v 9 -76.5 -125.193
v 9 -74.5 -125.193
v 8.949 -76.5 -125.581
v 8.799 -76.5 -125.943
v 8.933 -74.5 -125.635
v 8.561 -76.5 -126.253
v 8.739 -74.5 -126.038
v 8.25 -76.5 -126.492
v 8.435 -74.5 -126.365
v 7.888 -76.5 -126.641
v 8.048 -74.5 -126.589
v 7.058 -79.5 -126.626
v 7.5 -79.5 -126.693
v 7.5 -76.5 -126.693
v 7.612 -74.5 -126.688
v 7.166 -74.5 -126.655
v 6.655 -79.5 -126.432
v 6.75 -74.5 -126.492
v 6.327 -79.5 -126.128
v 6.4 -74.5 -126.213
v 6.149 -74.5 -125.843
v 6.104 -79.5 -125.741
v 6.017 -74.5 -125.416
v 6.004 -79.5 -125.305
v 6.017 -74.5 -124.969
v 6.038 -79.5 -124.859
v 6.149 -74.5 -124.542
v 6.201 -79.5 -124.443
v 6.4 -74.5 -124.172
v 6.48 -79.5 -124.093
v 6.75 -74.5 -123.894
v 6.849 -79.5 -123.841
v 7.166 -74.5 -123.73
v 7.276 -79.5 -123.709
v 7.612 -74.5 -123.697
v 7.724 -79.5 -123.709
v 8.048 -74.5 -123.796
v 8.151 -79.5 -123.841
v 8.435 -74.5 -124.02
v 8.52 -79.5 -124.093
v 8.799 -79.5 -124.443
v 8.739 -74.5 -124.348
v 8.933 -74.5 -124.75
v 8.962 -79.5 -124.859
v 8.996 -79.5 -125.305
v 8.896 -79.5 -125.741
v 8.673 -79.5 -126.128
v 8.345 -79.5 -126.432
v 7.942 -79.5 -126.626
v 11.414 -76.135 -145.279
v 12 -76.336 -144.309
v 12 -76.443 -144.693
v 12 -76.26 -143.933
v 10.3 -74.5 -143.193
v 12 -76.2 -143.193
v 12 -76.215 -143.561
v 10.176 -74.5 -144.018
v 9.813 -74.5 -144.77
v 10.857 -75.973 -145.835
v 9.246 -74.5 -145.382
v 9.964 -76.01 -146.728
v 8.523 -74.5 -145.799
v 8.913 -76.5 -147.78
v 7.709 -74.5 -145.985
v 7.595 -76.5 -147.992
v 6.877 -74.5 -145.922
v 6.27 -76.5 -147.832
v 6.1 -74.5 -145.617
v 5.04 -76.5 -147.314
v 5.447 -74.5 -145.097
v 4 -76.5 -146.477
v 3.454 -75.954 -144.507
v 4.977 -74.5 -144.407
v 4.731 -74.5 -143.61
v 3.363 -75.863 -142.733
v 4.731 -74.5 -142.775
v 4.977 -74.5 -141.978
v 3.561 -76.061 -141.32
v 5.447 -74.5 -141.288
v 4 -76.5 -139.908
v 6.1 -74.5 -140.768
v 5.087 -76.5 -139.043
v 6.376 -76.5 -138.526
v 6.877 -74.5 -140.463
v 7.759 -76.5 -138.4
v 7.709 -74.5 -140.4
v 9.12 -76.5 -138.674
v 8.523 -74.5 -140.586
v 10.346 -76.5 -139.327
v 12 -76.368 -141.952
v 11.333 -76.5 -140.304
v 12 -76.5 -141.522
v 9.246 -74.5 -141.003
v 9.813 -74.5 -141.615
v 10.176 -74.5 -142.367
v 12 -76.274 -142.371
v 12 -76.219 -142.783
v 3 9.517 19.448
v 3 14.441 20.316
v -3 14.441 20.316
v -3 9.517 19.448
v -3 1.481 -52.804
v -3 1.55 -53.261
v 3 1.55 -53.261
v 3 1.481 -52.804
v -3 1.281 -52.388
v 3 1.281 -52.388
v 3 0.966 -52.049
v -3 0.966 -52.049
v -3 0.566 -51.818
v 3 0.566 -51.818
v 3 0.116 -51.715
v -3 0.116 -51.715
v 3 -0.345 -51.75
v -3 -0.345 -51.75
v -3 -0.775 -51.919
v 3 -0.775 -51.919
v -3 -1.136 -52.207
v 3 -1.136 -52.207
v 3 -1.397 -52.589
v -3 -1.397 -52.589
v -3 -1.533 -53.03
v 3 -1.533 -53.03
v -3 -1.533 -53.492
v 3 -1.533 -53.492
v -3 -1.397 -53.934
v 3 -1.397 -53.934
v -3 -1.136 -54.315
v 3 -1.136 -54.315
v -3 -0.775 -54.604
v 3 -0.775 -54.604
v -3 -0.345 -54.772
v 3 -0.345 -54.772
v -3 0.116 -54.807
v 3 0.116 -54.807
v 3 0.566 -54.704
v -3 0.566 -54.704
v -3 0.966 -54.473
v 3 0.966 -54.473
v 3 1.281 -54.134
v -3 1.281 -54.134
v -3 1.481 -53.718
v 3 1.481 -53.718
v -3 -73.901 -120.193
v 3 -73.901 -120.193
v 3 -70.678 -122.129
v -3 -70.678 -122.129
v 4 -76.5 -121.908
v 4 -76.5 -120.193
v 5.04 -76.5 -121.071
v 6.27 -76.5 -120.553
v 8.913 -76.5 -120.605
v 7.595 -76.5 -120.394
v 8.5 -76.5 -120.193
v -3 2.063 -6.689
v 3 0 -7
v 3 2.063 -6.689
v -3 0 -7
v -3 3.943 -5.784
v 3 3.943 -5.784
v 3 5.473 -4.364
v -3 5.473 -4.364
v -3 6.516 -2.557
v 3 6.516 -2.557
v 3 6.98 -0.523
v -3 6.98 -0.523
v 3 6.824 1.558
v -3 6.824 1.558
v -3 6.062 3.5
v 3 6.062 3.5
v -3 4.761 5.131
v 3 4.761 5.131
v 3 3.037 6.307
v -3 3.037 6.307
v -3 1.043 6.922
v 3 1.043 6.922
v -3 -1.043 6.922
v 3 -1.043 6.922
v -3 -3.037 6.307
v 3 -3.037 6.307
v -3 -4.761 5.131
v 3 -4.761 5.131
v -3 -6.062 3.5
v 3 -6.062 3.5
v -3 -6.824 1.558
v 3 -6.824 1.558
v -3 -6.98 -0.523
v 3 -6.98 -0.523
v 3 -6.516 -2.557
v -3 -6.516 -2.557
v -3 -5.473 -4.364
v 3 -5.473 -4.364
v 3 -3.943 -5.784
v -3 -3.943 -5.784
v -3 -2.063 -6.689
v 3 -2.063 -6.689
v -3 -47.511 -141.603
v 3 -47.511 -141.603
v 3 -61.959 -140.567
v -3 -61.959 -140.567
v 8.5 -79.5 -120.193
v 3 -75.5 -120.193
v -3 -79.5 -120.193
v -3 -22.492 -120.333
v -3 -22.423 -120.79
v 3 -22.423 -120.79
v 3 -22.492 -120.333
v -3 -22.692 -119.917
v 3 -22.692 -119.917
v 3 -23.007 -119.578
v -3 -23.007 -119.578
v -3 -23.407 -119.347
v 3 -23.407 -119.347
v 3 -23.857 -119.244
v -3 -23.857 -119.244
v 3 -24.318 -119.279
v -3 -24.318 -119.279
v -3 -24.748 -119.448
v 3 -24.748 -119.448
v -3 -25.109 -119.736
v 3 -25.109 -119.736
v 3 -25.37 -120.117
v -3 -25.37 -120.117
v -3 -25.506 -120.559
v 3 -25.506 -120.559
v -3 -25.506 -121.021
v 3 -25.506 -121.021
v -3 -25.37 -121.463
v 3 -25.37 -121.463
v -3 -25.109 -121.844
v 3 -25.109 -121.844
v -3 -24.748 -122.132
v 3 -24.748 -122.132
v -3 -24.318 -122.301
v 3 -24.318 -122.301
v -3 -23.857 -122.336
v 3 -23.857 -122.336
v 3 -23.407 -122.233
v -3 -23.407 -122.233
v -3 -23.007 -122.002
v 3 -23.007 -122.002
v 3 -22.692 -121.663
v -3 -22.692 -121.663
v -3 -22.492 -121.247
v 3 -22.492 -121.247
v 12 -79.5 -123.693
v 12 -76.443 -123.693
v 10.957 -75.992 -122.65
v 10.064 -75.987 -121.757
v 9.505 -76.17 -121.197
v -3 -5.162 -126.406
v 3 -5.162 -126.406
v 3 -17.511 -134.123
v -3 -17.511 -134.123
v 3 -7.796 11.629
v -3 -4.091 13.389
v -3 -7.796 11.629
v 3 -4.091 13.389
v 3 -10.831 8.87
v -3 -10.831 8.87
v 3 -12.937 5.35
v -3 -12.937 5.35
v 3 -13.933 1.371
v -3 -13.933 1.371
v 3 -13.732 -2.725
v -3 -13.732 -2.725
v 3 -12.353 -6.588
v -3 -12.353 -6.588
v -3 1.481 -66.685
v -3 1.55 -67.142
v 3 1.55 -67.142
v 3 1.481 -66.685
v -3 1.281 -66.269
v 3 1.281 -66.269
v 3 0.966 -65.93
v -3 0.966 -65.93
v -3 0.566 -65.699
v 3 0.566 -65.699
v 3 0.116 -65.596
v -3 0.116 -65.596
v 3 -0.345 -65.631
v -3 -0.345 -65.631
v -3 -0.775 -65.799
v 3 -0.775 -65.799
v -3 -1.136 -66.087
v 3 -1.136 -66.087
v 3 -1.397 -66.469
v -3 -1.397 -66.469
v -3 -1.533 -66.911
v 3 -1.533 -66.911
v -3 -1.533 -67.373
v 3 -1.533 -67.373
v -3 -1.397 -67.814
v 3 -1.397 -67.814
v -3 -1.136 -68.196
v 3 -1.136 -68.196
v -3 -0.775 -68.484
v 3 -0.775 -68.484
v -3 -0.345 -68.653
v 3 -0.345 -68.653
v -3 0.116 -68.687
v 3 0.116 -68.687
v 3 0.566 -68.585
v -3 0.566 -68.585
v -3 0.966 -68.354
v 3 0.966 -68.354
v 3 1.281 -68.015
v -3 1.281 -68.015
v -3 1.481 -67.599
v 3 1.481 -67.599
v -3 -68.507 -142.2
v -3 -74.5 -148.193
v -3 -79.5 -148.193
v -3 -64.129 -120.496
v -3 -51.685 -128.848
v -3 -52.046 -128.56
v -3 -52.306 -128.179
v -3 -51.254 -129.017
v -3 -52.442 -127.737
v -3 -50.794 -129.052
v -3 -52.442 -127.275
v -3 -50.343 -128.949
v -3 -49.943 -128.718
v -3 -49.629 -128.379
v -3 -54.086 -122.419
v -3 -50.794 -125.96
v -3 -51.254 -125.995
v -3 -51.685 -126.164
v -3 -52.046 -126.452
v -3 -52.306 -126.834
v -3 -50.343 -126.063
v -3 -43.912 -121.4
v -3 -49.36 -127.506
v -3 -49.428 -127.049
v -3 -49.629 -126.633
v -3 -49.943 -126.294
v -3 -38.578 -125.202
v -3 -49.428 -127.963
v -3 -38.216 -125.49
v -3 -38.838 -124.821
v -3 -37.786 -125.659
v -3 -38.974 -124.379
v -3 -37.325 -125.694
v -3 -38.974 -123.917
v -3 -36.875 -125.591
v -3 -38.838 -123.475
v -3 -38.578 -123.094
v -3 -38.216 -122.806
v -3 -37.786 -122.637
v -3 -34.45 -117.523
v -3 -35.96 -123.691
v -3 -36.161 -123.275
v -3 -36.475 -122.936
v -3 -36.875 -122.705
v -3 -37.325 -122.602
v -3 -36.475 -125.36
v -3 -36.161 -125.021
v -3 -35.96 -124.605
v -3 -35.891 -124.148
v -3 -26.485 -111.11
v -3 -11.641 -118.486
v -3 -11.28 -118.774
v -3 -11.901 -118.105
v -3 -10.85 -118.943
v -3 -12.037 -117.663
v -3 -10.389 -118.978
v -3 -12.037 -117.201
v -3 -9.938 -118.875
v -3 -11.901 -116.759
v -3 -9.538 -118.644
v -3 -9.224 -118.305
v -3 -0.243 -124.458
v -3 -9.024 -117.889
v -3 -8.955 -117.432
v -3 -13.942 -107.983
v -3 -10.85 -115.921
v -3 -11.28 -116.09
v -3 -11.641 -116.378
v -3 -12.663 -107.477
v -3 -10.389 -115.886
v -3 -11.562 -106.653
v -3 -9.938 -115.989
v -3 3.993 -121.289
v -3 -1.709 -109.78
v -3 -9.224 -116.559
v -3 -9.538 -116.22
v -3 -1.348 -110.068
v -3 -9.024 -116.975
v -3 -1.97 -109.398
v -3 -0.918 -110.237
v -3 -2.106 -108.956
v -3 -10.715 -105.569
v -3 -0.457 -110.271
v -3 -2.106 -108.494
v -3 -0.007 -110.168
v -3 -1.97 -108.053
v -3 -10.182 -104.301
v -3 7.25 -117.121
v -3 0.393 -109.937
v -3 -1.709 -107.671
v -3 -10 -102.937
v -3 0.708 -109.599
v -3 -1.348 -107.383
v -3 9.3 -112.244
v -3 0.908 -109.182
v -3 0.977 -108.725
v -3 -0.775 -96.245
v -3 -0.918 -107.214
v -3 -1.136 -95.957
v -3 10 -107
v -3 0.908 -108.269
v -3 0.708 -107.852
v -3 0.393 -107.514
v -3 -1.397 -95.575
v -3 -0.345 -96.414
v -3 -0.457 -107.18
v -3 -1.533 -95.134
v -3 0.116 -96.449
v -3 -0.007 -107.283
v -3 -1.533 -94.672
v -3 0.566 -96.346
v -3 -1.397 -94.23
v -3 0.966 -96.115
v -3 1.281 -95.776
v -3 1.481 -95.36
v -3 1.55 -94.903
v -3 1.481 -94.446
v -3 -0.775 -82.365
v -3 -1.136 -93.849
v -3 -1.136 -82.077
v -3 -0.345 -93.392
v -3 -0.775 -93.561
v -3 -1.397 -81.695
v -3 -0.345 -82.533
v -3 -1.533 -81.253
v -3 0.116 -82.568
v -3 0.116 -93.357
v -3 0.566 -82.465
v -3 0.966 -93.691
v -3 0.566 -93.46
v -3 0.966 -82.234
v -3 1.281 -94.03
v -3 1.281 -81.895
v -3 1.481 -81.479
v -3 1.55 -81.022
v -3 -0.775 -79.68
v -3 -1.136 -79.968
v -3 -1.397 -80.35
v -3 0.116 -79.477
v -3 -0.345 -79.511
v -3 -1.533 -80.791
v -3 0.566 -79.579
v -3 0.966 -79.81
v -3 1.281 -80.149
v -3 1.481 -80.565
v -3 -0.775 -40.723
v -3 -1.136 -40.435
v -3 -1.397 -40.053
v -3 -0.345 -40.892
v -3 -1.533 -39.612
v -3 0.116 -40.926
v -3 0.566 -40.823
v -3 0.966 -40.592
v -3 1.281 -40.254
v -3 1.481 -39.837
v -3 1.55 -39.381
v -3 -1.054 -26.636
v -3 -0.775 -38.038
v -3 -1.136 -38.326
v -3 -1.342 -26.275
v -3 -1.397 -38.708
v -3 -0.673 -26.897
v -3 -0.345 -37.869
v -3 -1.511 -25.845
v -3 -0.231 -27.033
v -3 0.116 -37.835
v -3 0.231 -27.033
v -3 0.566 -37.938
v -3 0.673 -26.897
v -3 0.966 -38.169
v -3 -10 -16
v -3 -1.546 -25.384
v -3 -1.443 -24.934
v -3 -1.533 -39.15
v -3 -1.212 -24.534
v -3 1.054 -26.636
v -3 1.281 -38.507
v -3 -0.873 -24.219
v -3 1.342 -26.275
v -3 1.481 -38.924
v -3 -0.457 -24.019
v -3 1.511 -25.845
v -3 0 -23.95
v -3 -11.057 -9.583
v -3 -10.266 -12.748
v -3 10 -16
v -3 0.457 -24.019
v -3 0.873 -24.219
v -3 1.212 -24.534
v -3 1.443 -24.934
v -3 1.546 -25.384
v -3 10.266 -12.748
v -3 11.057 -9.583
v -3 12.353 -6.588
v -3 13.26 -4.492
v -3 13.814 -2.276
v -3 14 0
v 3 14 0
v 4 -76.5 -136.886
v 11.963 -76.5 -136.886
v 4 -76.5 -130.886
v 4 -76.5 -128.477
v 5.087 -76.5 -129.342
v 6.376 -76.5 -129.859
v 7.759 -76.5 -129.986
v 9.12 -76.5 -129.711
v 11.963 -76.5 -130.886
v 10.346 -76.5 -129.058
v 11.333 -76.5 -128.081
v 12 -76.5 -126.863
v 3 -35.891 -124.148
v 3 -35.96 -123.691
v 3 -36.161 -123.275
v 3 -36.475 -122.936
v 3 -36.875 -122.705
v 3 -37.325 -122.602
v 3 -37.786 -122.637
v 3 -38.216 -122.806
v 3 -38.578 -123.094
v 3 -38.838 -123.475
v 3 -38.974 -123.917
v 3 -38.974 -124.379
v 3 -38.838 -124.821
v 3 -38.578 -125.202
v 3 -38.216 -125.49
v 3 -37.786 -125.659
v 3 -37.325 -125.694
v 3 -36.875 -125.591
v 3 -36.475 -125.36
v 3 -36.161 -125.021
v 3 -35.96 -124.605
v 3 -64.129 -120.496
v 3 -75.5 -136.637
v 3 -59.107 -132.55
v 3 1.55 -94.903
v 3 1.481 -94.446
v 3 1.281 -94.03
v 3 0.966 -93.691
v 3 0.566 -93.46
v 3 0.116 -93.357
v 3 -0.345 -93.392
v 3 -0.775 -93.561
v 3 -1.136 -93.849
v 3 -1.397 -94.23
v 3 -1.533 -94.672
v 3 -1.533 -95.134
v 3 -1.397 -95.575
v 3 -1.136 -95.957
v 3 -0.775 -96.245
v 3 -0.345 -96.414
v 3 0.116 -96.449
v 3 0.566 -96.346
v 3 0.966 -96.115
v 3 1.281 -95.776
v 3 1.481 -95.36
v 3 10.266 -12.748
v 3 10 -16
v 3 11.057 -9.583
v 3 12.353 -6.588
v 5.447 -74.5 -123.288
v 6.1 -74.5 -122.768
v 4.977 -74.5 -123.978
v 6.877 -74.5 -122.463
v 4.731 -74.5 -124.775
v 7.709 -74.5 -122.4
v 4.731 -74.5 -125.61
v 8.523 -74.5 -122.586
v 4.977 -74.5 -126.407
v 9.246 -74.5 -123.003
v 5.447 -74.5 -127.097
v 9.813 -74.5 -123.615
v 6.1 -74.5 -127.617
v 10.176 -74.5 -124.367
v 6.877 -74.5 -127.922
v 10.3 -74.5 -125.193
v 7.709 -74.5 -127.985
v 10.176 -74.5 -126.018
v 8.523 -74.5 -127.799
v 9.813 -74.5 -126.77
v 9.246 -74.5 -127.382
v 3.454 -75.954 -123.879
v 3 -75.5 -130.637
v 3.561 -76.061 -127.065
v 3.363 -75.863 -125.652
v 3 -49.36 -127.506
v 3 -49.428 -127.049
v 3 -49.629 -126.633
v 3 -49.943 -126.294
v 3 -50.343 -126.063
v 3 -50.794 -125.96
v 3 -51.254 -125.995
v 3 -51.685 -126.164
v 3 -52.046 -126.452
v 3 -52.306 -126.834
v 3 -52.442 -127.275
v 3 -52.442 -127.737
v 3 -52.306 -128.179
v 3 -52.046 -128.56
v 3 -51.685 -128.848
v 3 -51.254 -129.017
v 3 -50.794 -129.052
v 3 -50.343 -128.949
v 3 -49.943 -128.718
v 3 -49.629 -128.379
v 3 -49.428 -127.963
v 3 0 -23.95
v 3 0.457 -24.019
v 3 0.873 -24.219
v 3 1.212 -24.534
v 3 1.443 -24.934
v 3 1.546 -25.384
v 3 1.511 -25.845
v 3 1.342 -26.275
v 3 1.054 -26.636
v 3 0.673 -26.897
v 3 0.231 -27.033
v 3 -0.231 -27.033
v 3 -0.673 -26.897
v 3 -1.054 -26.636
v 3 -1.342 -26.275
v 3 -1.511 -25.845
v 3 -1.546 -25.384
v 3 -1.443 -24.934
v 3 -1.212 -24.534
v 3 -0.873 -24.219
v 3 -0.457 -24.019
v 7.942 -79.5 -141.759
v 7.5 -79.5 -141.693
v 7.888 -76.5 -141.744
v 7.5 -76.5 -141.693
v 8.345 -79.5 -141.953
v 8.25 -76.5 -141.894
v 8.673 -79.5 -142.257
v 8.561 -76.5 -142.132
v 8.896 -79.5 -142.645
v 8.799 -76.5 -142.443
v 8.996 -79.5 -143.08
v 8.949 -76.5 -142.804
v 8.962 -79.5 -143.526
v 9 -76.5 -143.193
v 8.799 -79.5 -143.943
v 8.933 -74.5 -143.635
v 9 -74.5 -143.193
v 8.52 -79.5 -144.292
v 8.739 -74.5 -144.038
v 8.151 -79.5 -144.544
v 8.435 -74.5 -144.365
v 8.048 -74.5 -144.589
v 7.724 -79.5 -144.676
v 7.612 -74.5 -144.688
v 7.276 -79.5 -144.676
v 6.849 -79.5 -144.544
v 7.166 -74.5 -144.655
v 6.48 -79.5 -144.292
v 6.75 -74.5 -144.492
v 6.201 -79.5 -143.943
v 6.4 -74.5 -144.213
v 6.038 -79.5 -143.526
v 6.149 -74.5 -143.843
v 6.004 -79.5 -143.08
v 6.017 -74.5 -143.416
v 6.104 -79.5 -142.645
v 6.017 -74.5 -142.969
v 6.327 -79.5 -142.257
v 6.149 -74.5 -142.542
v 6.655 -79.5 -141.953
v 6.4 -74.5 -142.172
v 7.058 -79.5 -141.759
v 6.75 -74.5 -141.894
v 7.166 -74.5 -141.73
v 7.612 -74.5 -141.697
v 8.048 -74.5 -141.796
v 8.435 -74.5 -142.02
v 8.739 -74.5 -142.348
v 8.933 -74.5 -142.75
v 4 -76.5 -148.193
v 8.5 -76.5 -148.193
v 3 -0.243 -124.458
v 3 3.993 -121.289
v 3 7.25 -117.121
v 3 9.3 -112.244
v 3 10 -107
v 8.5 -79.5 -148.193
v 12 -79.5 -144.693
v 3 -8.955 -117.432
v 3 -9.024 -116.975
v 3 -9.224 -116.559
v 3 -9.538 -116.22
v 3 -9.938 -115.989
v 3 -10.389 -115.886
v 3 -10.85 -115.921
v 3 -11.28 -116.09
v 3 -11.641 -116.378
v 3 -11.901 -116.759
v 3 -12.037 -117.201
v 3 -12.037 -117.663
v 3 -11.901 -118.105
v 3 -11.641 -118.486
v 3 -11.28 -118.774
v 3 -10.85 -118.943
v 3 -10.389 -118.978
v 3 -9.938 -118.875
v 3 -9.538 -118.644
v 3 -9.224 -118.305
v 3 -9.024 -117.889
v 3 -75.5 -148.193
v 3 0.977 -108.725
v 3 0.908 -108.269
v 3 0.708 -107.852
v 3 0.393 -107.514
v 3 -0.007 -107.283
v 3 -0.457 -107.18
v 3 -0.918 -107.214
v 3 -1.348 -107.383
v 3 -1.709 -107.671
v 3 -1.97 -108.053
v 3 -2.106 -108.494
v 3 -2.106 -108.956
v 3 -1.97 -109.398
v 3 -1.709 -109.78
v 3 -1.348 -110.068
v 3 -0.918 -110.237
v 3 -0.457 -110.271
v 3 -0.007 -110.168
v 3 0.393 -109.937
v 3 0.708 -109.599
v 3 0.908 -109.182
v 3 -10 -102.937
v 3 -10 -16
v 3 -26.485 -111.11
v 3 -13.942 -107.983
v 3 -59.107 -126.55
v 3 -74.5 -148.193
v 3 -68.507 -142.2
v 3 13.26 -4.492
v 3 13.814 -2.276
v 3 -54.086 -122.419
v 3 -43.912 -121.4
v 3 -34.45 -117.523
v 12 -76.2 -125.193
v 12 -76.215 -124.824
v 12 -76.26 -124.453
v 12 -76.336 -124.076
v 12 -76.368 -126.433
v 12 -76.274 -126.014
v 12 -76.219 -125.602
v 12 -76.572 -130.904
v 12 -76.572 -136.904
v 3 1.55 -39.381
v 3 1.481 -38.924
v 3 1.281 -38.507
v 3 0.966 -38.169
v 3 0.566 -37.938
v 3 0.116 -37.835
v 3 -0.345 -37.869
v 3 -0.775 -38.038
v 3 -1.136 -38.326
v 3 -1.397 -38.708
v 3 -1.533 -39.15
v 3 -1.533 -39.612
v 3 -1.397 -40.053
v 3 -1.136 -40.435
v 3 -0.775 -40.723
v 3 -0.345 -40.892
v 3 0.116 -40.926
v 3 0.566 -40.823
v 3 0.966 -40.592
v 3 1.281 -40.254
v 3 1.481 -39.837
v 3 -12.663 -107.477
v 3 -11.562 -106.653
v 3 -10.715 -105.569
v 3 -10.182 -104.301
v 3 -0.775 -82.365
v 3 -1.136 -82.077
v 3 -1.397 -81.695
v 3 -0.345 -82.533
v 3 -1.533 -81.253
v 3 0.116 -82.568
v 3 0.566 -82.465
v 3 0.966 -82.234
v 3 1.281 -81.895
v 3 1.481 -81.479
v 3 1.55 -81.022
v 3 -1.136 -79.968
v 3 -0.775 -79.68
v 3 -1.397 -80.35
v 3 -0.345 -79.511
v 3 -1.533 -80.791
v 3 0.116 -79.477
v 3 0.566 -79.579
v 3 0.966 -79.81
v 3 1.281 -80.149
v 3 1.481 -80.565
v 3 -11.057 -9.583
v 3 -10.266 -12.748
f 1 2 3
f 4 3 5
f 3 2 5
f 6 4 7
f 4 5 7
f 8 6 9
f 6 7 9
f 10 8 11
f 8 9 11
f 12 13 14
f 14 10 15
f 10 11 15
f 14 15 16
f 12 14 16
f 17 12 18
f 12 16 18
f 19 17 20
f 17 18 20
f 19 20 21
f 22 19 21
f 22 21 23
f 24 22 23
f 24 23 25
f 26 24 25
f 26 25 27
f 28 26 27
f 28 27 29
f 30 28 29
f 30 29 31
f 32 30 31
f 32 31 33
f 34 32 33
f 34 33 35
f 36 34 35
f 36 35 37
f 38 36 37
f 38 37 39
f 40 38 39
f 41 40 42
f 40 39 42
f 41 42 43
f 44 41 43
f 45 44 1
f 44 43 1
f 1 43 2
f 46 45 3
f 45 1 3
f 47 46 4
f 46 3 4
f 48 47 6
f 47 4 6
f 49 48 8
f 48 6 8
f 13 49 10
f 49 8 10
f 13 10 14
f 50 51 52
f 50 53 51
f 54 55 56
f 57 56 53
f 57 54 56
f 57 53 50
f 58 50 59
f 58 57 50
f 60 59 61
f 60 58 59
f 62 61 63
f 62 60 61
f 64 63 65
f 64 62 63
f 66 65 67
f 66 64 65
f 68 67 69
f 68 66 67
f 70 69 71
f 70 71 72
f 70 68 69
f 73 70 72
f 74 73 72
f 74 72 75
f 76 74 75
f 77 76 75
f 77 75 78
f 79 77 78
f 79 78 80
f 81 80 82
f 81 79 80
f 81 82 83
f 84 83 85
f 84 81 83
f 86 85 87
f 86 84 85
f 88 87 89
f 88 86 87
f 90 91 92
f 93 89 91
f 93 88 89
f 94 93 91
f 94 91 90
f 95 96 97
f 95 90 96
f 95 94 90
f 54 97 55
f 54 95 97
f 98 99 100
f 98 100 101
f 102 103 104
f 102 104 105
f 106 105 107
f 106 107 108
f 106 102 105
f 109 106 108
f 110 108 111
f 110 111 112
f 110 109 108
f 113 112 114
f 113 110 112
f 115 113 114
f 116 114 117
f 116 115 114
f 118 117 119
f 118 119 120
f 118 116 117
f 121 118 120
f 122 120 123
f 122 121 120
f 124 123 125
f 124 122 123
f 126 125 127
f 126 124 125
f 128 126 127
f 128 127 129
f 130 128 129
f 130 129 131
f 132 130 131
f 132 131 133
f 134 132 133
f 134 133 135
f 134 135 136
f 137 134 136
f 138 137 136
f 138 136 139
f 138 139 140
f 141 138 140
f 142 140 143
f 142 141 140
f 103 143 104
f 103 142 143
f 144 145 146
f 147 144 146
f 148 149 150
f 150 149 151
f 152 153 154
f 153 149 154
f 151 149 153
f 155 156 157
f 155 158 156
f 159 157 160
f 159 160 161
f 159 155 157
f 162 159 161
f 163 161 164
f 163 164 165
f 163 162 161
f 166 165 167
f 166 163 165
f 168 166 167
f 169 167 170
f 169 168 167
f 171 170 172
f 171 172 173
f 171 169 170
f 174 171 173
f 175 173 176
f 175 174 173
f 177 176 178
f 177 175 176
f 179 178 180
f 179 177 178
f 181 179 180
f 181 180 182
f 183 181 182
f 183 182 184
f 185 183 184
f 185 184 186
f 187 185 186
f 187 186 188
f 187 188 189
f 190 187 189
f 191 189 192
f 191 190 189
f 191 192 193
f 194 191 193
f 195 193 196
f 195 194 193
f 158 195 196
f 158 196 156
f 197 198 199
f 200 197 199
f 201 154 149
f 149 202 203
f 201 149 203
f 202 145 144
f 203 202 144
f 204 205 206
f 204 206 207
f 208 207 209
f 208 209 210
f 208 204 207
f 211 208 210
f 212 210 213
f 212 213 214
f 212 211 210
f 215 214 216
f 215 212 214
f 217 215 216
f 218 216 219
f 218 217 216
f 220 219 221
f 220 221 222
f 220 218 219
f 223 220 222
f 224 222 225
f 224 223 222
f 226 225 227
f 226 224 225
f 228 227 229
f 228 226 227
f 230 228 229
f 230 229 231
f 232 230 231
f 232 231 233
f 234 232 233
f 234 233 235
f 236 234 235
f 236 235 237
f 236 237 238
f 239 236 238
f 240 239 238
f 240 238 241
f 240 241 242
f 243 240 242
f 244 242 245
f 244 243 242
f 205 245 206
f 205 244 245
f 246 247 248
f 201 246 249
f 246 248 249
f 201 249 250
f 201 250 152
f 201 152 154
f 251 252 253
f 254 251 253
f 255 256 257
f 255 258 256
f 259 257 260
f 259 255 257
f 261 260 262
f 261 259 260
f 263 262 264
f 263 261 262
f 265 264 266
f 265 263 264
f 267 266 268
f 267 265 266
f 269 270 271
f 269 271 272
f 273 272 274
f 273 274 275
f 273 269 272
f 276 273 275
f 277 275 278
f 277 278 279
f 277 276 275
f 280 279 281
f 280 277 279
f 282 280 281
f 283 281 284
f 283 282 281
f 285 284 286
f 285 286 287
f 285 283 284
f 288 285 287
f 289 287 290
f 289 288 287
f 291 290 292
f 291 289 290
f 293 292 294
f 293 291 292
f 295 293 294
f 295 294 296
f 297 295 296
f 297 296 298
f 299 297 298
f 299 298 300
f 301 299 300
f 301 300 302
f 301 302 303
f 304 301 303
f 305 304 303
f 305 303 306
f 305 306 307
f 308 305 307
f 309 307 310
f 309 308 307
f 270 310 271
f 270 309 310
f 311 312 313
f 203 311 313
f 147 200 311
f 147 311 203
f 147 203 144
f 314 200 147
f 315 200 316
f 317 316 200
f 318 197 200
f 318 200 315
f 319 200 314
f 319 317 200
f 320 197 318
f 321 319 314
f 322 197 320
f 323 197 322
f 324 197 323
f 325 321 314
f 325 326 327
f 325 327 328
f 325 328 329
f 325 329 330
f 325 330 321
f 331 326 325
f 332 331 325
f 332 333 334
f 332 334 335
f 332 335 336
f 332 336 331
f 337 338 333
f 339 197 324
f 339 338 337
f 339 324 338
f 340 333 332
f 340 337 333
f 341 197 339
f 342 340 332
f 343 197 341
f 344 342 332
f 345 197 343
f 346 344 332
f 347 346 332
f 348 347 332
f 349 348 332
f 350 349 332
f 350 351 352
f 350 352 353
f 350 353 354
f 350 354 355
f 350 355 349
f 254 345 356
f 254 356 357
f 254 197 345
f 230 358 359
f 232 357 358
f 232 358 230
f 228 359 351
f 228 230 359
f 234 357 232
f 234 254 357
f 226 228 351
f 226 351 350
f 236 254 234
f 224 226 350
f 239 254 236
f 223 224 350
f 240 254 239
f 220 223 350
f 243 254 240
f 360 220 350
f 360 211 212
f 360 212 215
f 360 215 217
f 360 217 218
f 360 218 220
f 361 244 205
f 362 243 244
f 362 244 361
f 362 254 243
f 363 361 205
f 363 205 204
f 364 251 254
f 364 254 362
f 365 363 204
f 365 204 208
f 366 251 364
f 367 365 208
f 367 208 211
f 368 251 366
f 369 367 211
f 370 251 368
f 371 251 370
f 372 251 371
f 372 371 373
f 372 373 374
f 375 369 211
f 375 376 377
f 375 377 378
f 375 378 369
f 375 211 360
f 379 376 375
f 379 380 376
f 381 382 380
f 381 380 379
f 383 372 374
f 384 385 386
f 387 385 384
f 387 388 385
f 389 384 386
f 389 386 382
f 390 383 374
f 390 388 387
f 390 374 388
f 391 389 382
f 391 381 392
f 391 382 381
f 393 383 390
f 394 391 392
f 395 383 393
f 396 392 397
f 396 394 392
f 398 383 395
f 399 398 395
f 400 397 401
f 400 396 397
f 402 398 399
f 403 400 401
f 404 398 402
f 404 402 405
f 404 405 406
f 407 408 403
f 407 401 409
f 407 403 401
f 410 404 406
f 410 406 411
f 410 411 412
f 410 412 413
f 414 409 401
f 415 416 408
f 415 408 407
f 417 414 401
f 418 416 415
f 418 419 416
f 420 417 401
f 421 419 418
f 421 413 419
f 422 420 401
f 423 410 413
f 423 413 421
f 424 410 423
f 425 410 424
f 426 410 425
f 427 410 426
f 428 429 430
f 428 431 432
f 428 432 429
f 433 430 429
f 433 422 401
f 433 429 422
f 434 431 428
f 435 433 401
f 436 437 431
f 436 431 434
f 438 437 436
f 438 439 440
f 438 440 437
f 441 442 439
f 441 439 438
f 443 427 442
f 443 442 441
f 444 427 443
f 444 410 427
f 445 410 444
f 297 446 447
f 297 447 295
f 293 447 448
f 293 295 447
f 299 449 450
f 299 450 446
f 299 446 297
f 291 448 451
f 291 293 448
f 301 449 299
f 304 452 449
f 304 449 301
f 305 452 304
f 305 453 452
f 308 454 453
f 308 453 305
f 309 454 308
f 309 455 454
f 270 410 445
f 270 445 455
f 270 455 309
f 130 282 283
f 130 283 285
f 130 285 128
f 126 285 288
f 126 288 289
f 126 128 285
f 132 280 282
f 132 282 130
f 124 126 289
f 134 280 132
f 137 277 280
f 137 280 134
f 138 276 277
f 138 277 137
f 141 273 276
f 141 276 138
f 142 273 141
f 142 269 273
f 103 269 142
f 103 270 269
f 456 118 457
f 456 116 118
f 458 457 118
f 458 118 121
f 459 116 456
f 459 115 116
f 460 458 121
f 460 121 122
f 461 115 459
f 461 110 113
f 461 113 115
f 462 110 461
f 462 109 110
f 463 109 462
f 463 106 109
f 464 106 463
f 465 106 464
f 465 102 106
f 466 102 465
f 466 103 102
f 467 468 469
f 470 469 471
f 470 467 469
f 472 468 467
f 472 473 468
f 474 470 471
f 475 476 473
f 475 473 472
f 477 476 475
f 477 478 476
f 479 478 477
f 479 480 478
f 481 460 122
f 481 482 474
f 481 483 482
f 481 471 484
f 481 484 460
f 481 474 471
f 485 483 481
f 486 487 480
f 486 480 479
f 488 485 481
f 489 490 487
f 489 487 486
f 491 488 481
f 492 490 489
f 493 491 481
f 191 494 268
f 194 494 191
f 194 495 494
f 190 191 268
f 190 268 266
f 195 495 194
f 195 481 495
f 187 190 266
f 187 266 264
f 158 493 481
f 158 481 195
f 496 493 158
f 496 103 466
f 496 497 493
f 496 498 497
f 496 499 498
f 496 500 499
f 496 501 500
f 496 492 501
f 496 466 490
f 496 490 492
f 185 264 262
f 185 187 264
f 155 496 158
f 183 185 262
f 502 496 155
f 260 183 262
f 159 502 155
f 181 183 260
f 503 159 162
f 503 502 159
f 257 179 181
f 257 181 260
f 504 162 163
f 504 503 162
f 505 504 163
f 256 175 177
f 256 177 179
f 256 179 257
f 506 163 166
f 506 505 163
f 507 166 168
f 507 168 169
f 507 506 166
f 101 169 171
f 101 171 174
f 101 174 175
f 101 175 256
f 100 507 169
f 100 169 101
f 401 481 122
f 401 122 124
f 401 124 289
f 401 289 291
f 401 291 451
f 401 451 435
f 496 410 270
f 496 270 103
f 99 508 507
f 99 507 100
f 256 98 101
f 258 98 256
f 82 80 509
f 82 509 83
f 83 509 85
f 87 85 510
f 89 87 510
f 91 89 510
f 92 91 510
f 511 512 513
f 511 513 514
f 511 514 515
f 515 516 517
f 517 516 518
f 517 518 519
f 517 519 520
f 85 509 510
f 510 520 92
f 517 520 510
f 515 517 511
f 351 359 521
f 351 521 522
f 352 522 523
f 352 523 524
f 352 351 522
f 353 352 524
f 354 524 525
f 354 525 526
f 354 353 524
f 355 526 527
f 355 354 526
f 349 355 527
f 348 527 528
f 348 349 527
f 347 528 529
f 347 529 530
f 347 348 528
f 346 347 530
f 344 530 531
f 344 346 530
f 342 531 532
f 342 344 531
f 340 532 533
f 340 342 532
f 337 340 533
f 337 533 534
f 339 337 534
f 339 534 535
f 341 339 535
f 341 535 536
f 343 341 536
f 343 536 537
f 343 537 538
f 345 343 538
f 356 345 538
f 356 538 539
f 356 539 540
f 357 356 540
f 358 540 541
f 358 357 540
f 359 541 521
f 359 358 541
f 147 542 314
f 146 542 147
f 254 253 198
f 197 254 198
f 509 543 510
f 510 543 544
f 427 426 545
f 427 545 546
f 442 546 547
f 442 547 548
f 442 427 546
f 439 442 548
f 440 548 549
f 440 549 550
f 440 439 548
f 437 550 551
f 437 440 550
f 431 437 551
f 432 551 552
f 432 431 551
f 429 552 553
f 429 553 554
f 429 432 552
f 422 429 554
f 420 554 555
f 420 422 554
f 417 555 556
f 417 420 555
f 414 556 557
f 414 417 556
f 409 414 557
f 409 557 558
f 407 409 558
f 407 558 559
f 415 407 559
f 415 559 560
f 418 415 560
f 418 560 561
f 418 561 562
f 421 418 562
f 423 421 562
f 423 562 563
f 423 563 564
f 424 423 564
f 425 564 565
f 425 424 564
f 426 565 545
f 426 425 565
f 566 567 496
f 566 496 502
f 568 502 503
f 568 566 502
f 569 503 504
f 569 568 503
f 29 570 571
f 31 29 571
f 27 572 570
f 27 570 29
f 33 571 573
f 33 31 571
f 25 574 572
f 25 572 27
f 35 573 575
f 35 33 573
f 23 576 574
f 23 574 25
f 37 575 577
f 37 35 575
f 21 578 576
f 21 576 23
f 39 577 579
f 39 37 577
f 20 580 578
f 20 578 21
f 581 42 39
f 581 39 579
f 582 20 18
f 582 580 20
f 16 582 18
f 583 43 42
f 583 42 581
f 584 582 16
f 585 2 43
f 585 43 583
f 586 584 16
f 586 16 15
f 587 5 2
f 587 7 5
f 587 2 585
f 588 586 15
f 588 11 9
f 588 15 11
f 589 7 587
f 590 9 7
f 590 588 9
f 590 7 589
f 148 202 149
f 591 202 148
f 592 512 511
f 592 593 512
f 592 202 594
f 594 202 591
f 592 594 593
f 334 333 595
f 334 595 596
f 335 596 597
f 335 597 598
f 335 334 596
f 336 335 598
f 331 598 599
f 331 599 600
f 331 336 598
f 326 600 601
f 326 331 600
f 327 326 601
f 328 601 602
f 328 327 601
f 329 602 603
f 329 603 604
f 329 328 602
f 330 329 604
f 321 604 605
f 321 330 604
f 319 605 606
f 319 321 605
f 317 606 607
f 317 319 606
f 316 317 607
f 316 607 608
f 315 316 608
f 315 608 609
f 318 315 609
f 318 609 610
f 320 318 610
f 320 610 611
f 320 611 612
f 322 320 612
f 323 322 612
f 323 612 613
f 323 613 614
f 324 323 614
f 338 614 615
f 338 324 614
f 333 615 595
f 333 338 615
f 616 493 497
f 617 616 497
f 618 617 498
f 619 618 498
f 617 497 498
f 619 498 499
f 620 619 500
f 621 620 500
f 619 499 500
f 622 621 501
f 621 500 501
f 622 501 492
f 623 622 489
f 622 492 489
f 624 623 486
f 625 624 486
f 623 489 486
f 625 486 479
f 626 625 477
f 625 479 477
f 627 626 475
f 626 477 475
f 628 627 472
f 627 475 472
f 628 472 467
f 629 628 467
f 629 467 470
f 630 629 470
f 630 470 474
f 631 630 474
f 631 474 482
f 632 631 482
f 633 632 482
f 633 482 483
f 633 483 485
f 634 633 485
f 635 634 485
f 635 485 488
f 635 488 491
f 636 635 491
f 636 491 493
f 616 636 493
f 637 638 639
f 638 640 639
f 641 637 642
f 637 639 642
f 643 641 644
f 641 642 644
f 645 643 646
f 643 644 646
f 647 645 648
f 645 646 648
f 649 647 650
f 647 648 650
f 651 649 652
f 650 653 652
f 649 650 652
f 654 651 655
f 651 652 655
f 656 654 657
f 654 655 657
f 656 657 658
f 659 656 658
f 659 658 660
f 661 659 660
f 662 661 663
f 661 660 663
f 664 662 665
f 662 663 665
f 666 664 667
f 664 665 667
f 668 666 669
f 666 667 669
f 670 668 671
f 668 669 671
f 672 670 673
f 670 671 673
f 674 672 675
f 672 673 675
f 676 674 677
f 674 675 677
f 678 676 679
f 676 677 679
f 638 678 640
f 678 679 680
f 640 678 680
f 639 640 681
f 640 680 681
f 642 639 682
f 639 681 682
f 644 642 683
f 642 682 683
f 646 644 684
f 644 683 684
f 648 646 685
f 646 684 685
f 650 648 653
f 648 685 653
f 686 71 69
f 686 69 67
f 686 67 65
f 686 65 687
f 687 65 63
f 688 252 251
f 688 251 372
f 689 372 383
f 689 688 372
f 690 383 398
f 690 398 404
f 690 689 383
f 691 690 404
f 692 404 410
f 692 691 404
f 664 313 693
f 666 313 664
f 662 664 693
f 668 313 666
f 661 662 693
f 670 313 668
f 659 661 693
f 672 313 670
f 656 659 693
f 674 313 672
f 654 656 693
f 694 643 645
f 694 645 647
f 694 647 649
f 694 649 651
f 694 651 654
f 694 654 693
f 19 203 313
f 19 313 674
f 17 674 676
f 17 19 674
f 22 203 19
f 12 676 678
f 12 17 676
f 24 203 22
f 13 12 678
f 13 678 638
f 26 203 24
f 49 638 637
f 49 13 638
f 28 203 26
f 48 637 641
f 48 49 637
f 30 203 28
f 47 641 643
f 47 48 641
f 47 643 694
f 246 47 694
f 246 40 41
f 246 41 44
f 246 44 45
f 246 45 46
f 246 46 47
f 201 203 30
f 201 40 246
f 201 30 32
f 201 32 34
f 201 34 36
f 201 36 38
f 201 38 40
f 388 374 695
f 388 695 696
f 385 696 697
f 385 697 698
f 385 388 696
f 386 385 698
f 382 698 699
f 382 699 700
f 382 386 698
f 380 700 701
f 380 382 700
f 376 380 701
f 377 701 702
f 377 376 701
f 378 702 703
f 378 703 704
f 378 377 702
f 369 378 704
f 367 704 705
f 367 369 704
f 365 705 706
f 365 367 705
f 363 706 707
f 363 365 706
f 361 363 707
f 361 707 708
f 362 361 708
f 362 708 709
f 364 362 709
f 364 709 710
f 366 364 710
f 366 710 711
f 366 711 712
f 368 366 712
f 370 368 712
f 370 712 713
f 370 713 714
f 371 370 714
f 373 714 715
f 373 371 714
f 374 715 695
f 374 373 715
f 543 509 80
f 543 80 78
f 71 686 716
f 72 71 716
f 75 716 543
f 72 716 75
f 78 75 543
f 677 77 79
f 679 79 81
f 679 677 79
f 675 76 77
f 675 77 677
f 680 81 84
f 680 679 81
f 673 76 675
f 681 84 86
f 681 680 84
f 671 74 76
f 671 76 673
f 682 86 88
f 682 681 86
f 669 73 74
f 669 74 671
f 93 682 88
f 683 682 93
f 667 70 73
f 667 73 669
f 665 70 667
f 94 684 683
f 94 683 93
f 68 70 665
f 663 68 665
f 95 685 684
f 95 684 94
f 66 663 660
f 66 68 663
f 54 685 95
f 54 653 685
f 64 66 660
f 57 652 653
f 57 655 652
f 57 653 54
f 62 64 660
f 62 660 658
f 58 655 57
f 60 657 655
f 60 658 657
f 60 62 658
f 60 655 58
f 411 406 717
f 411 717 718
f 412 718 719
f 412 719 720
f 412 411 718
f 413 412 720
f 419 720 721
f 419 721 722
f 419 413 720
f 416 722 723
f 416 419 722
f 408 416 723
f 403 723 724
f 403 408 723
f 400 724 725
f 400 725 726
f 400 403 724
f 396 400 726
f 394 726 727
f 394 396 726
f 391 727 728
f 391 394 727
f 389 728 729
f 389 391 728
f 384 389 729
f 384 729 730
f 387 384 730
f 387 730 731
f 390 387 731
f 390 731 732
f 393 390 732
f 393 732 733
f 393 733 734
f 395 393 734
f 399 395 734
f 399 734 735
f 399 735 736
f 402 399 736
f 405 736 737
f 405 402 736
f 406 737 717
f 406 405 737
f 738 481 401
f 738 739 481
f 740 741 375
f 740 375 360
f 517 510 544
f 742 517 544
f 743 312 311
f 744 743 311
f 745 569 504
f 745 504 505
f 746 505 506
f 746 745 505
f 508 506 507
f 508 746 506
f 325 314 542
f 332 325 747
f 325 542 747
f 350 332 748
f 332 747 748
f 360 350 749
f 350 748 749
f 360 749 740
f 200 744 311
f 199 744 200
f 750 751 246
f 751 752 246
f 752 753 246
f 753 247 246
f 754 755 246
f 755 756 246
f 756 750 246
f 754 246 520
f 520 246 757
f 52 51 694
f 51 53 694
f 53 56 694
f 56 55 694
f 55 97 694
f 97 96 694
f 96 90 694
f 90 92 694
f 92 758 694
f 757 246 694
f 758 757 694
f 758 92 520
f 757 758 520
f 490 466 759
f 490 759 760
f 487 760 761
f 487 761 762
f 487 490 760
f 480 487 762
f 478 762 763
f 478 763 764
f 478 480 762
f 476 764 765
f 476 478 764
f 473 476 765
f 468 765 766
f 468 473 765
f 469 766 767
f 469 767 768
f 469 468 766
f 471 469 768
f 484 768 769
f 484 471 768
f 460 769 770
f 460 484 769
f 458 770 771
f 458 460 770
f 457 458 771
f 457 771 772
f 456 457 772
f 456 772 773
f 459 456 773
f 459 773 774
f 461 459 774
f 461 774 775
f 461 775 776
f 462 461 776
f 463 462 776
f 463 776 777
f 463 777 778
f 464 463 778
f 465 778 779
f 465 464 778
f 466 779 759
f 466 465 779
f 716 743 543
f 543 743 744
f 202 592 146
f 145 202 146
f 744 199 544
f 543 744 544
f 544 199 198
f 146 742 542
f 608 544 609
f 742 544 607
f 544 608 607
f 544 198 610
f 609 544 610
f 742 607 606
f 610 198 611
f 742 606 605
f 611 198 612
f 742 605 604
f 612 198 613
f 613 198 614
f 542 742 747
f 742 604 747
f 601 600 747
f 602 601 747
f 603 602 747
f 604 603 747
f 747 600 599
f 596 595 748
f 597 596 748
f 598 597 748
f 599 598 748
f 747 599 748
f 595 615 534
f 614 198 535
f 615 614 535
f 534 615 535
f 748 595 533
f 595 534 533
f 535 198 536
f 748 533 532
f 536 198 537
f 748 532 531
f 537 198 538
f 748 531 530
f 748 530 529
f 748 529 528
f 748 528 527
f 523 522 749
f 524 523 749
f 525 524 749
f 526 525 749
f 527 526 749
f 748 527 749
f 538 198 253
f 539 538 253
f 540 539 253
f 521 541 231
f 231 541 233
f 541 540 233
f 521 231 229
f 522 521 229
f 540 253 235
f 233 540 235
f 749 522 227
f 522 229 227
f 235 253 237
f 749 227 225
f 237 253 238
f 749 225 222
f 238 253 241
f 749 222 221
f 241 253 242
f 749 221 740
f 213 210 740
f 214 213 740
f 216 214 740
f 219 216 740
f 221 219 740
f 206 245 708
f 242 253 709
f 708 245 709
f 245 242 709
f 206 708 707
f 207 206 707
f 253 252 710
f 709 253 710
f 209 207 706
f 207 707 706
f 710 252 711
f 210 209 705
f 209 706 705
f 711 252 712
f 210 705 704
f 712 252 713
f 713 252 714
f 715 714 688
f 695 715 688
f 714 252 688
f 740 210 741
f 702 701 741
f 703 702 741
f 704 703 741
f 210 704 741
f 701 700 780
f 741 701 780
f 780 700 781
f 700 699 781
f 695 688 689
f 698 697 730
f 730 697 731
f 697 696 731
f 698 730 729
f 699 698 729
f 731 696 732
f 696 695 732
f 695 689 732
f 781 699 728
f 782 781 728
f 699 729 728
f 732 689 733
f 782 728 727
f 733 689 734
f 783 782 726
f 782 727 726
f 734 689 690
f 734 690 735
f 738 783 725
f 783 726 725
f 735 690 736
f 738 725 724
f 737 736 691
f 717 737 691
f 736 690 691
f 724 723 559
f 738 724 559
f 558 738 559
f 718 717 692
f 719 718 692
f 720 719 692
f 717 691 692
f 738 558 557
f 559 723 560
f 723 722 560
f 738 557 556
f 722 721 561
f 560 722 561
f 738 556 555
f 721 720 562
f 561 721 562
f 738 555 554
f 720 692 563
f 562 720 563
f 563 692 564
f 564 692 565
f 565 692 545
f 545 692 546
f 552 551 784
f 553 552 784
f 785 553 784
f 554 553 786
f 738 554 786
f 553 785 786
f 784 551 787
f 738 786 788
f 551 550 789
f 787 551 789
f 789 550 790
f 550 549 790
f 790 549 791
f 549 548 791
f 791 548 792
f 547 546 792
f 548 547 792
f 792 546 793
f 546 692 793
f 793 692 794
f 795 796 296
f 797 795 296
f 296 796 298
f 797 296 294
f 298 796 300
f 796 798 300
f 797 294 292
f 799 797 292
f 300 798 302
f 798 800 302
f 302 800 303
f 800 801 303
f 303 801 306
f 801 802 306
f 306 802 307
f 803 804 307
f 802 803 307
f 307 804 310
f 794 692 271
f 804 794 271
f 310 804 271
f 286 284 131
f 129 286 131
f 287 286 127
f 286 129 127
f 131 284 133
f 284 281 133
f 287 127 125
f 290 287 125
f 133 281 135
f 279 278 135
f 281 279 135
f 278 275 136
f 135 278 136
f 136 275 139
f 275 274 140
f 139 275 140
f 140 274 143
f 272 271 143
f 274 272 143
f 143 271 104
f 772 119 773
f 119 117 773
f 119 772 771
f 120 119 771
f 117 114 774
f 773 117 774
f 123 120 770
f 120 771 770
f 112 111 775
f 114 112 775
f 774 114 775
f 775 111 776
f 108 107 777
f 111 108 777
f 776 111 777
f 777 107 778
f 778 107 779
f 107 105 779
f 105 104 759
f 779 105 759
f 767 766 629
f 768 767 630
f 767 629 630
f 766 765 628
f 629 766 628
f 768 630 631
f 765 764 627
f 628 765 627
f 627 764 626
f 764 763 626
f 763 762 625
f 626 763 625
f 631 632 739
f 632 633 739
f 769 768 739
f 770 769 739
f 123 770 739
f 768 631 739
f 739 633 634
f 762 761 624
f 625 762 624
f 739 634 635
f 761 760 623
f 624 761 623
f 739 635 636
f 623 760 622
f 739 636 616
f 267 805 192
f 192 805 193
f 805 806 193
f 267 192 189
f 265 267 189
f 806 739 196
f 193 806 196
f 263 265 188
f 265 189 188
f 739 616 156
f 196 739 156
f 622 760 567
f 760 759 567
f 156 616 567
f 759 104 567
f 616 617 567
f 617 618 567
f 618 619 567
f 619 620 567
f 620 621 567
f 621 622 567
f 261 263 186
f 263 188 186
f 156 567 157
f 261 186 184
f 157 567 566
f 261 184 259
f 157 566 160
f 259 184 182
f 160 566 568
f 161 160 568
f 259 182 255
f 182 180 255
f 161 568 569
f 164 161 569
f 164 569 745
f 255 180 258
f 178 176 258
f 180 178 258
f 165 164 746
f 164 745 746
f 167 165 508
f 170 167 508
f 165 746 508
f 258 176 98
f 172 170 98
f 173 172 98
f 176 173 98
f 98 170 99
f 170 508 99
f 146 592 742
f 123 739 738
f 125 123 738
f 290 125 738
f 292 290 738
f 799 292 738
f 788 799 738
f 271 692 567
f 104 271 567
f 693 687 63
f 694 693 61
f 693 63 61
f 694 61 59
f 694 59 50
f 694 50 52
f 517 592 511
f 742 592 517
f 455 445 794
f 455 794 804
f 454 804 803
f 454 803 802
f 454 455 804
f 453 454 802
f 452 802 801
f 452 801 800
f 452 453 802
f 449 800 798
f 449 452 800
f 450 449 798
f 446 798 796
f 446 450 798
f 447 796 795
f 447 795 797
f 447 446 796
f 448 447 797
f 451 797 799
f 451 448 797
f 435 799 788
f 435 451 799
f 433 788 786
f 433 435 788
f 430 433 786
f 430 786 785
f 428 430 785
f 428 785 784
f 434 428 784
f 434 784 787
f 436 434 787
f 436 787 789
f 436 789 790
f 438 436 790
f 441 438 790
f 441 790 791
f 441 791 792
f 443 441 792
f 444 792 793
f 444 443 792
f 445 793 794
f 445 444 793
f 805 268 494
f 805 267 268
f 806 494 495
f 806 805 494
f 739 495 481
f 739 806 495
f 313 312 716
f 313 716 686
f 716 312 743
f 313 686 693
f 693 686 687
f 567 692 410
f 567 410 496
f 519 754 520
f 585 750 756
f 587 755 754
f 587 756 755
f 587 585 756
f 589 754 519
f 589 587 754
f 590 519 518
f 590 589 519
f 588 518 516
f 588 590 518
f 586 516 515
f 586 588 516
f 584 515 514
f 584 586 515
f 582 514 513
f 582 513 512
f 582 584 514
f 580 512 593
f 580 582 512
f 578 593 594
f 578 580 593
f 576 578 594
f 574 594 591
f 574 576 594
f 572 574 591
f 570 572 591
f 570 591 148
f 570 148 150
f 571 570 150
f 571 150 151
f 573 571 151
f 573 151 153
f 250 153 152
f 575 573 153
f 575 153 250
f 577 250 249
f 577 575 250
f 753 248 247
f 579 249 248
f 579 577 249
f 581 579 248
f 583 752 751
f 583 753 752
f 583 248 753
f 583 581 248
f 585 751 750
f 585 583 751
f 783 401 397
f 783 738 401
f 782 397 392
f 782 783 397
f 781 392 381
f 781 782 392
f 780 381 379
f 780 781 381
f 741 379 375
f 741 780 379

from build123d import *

# Parameters (mm, degrees)
SKETCH_1_R                = 7
EXTRUDE_1_DEPTH           = 3
SKETCH_5_W                = 15
SKETCH_5_H                = 28
EXTRUDE_3_DEPTH           = 3
SKETCH_6_R                = 1.5
CUT_EXTRUDE_2_DEPTH       = 175.055428478
CHAMFER_1_SIZE            = 3.5
SKETCH_10_R               = 1.55
CUT_EXTRUDE_3_DEPTH       = 10
PATTERN_START             = -3
PATTERN_CURVE_1_OUTLINE_R = 1.55
PATTERN_CURVE_1_DEPTH     = 6
EXTRUDE_4_DEPTH           = 6
EXTRUDE_5_DEPTH           = 3
CHAMFER_2_SIZE            = 1
CHAMFER_3_SIZE            = 4.949606318
CHAMFER_3_SIZE_2          = 6
CHAMFER_3_SIZE_3          = 8.237528241
EXTRUDE_START             = 2
SKETCH_17_R               = 2.8
SKETCH_17_R_2             = 1.5
EXTRUDE_1_2_DEPTH         = 2
CHAMFER_4_SIZE            = 2
SKETCH1_R                 = 35.5
CUT_EXTRUDE1_DEPTH        = 10
BOSS_EXTRUDE1_DEPTH       = 6


# Read off the part's stored shape, not the designer's step: 曲线阵列1
with BuildPart() as part:
    # 草图1 → Extrude 1 (new, symmetric)
    with BuildSketch(Plane(origin=(0, 0, 0), x_dir=(0, 0, -1), z_dir=(1, 0, 0))):
        with BuildLine():
            ThreePointArc((102.937314742, -10), (106.138754414, -11.102344081), (107.982852519, -13.942006143))
            Line((107.982852519, -13.942006143), (123.580312189, -76.5))
            Line((123.580312189, -76.5), (144.192584776, -76.5))
            Line((144.192584776, -76.5), (126.405914526, -5.161562088))
            ThreePointArc((126.405914526, -5.161562088), (119.313229507, 5.760215072), (107, 10))
            Line((107, 10), (16, 10))
            ThreePointArc((16, 10), (11.149287499, 10.597149997), (6.588235294, 12.352941176))
            ThreePointArc((6.588235294, 12.352941176), (3.395498751, 13.581995002), (0, 14))
            Line((0, 14), (-18, 14))
            Line((-18, 14), (-18, 11))
            Line((-18, 11), (-13.388941598, -4.090995342))
            ThreePointArc((-13.388941598, -4.090995342), (-5.350452205, -12.937258643), (6.588235294, -12.352941176))
            ThreePointArc((6.588235294, -12.352941176), (11.149287499, -10.597149997), (16, -10))
            Line((16, -10), (102.937314742, -10))
        make_face()
        Circle(SKETCH_1_R, mode=Mode.SUBTRACT)
    extrude(amount=EXTRUDE_1_DEPTH, both=True)

    # 草图5 → 凸台-拉伸3 (add)
    with BuildSketch(Plane.XZ.offset(76.5)):
        with Locations((4.5, -134.192584776)):
            Rectangle(SKETCH_5_W, SKETCH_5_H)
    extrude(amount=EXTRUDE_3_DEPTH)

    # 草图6 → 切除-拉伸2 (cut, through all)
    with BuildSketch(Plane(origin=(0, -76.5, 0), x_dir=(1, 0, 0), z_dir=(0, 1, 0))):
        with Locations(Location((7.5, 143.192584776, 0), (0, 0, 270))):
            Circle(SKETCH_6_R)
        with Locations(Location((7.5, 125.192584776, 0), (0, 0, 90))):
            Circle(SKETCH_6_R)
    extrude(amount=-CUT_EXTRUDE_2_DEPTH, mode=Mode.SUBTRACT)

    # 倒角1
    chamfer_1_edges = [part.edges().sort_by_distance(p)[0] for p in [
        (12, -78, -148.192584776),
        (12, -78, -120.192584776),
    ]]
    chamfer(chamfer_1_edges, length=CHAMFER_1_SIZE)

    # 草图10 → 切除-拉伸3 (cut)
    with BuildSketch(Plane.ZY.offset(3)):
        with Locations((-25.5, 0)):
            Circle(SKETCH_10_R)
    extrude(amount=-CUT_EXTRUDE_3_DEPTH, mode=Mode.SUBTRACT)

    # 曲线阵列1 outline → 曲线阵列1 (cut)
    with BuildSketch(Plane.YZ.offset(PATTERN_START)):
        with Locations((-50.909555093, -127.506033962)):
            Circle(PATTERN_CURVE_1_OUTLINE_R)
        with Locations((-37.441286405, -124.148017428)):
            Circle(PATTERN_CURVE_1_OUTLINE_R)
        with Locations((-23.973017717, -120.790000895)):
            Circle(PATTERN_CURVE_1_OUTLINE_R)
        with Locations((-10.504749029, -117.431984361)):
            Circle(PATTERN_CURVE_1_OUTLINE_R)
        with Locations((-0.573099264, -108.725472335)):
            Circle(PATTERN_CURVE_1_OUTLINE_R)
        with Locations((0, -94.902906369)):
            Circle(PATTERN_CURVE_1_OUTLINE_R)
        with Locations((0, -81.022325095)):
            Circle(PATTERN_CURVE_1_OUTLINE_R)
        with Locations((0, -67.141743821)):
            Circle(PATTERN_CURVE_1_OUTLINE_R)
        with Locations((0, -53.261162547)):
            Circle(PATTERN_CURVE_1_OUTLINE_R)
        with Locations((0, -39.380581274)):
            Circle(PATTERN_CURVE_1_OUTLINE_R)
    extrude(amount=PATTERN_CURVE_1_DEPTH, mode=Mode.SUBTRACT)

    # 草图15 → 凸台-拉伸4 (add)
    with BuildSketch(Plane(origin=(3, 0, 0), x_dir=(0, 0, -1), z_dir=(1, 0, 0))):
        Polygon((-20.316390831, 14.441494507), (-19.448149943, 9.517455742), (-13.388941598, -4.090995342), (-18, 11), (-18, 14), (0, 14), align=None)
    extrude(amount=-EXTRUDE_4_DEPTH)

    # 草图16 → 凸台-拉伸5 (add, symmetric, along a direction that is not the sketch's normal)
    with BuildSketch(Plane(origin=(0, 26.950685529, -108.093295667), x_dir=(-1, 0, 0), z_dir=(0, 0.2419218955996646, -0.9702957262759974))):
        Polygon((-12, -106.691747545), (-3, -88.691747545), (-3, -106.691747545), align=None)
    extrude(amount=EXTRUDE_5_DEPTH, dir=(0, 0, -1), both=True)

    # 倒角2
    chamfer_2_edges = [part.edges().sort_by_distance(p)[0] for p in [
        (3, -76.5, -140.539516629),
        (3, -76.5, -127.233380336),
    ]]
    chamfer(chamfer_2_edges, length=CHAMFER_2_SIZE)

    # 倒角3
    # the kernel refuses this chamfer: 8.237528241, 6, 4.949606318 mm, written as the material it adds along each edge
    with BuildSketch(Plane(origin=(19.430097928, -76.5, -123.580312189), x_dir=(0, -0.04051695164362419, 0.9991788511720553), z_dir=(-1, 0, 0))) as chamfer_3_piece_1_section:
        Polygon((CHAMFER_3_SIZE * 0.999178851168, CHAMFER_3_SIZE * 0.0405169516434), (CHAMFER_3_SIZE_2 * 0.202409816697, CHAMFER_3_SIZE_2 * 0.979300906823), (0, 0), align=None)
    chamfer_3_piece_1 = extrude(amount=22.430097928, mode=Mode.PRIVATE)
    chamfer_3_piece_1 = split(chamfer_3_piece_1, bisect_by=Plane(origin=(3, -73.046454267, -121.751433379), z_dir=(-1, 0, 0)), keep=Keep.TOP, mode=Mode.PRIVATE)
    chamfer_3_piece_1 = split(chamfer_3_piece_1, bisect_by=Plane(origin=(1.773227133, -73.046454267, -120.192584776), z_dir=(0, 0, -1)), keep=Keep.TOP, mode=Mode.PRIVATE)
    add(chamfer_3_piece_1)
    with BuildSketch(Plane(origin=(19.430097928, -76.5, -123.580312189), x_dir=(0, -0.04051695164362419, 0.9991788511720553), z_dir=(-1, 0, 0))) as chamfer_3_piece_2_section:
        Polygon((CHAMFER_3_SIZE * 0.999178851168, CHAMFER_3_SIZE * 0.0405169516434), (CHAMFER_3_SIZE_2 * 0.202409816697, CHAMFER_3_SIZE_2 * 0.979300906823), (0, 0), align=None)
    chamfer_3_piece_2 = extrude(amount=22.430097928, mode=Mode.PRIVATE)
    chamfer_3_piece_2 = split(chamfer_3_piece_2, bisect_by=Plane(origin=(3.335429121, -76.170858242, -120.192584776), z_dir=(0, 0, -1)), keep=Keep.TOP, mode=Mode.PRIVATE)
    chamfer_3_piece_2 = split(chamfer_3_piece_2, bisect_by=Plane(origin=(3.503143682, -76.003143682, -121.845416354), z_dir=(-0.7071067811865476, -0.7071067811865476, 0)), keep=Keep.TOP, mode=Mode.PRIVATE)
    add(chamfer_3_piece_2)
    with BuildSketch(Plane(origin=(-3, -76.5, -144.192584776), x_dir=(4.057410477830116e-15, -0.037354428652640735, -0.9993020797837033), z_dir=(1, 0, 0))) as chamfer_3_piece_3_section:
        Polygon((CHAMFER_3_SIZE_2 * 0.999302079784, CHAMFER_3_SIZE_2 * 0.0373544286526), (-CHAMFER_3_SIZE_3 * 0.277997895888, CHAMFER_3_SIZE_3 * 0.960581683052), (0, 0), align=None)
    chamfer_3_piece_3 = extrude(amount=28.304139536, mode=Mode.PRIVATE)
    chamfer_3_piece_3 = split(chamfer_3_piece_3, bisect_by=Plane(origin=(0.670769547, -73.170769547, -145.630202159), z_dir=(-0.7071067811865476, -0.7071067811865476, 0)), keep=Keep.TOP, mode=Mode.PRIVATE)
    chamfer_3_piece_3 = split(chamfer_3_piece_3, bisect_by=Plane(origin=(-0.598503723, -74.440042816, -148.192584776), z_dir=(0, 0, 1)), keep=Keep.TOP, mode=Mode.PRIVATE)
    add(chamfer_3_piece_3)
    with BuildSketch(Plane(origin=(-3, -76.5, -144.192584776), x_dir=(4.057410477830116e-15, -0.037354428652640735, -0.9993020797837033), z_dir=(1, 0, 0))) as chamfer_3_piece_4_section:
        Polygon((CHAMFER_3_SIZE_2 * 0.999302079784, CHAMFER_3_SIZE_2 * 0.0373544286526), (-CHAMFER_3_SIZE_3 * 0.277997895888, CHAMFER_3_SIZE_3 * 0.960581683052), (0, 0), align=None)
    chamfer_3_piece_4 = extrude(amount=28.304139536, mode=Mode.PRIVATE)
    chamfer_3_piece_4 = split(chamfer_3_piece_4, bisect_by=Plane(origin=(3, -72.000472632, -144.373314083), z_dir=(-1, 0, 0)), keep=Keep.TOP, mode=Mode.PRIVATE)
    chamfer_3_piece_4 = split(chamfer_3_piece_4, bisect_by=Plane(origin=(1.258880845, -72.000472632, -148.192584776), z_dir=(0, 0, 1)), keep=Keep.TOP, mode=Mode.PRIVATE)
    add(chamfer_3_piece_4)

    # 草图17 → Extrude 1 2 (add)
    # profile 1 of 2: a face of its own
    with BuildSketch(Plane(origin=(0, -76.5, 0), x_dir=(1, 0, 0), z_dir=(0, 1, 0)).offset(EXTRUDE_START)):
        with Locations((7.5, 125.192584776)):
            Circle(SKETCH_17_R)
        with Locations((7.5, 125.192584776)):
            Circle(SKETCH_17_R_2, mode=Mode.SUBTRACT)
    # profile 2 of 2: a face of its own
    with BuildSketch(Plane(origin=(0, -76.5, 0), x_dir=(1, 0, 0), z_dir=(0, 1, 0)).offset(EXTRUDE_START)):
        with Locations((7.5, 143.192584776)):
            Circle(SKETCH_17_R)
        with Locations((7.5, 143.192584776)):
            Circle(SKETCH_17_R_2, mode=Mode.SUBTRACT)
    extrude(amount=-EXTRUDE_1_2_DEPTH)

    # 倒角4
    # the kernel refuses this chamfer: 2 mm, written as the material it adds along each edge
    with BuildSketch(Plane(origin=(7.5, -76.5, -125.192584776), x_dir=(1, 0, 0), z_dir=(0, 0, 1))) as chamfer_4_piece_1_section:
        Polygon((2.8 + CHAMFER_4_SIZE, 0), (2.8, CHAMFER_4_SIZE), (2.8, 0), align=None)
    chamfer_4_piece_1 = revolve(axis=Axis((7.5, -76.5, -125.192584776), (0, 1, 0)), mode=Mode.PRIVATE)
    chamfer_4_piece_1 = split(chamfer_4_piece_1, bisect_by=Plane(origin=(8.598627061, -75.553822664, -120.291211837), z_dir=(-0.7071067811865476, 0, -0.7071067811865476)), keep=Keep.TOP, mode=Mode.PRIVATE)
    chamfer_4_piece_1 = split(chamfer_4_piece_1, bisect_by=Plane(origin=(12, -75.553822664, -125.192584776), z_dir=(-1, 0, 0)), keep=Keep.TOP, mode=Mode.PRIVATE)
    chamfer_4_piece_1 = split(chamfer_4_piece_1, bisect_by=Plane(origin=(3.697254122, -74.5, -125.192584776), z_dir=(0, -1, 0)), keep=Keep.TOP, mode=Mode.PRIVATE)
    add(chamfer_4_piece_1)
    with BuildSketch(Plane(origin=(7.5, -76.5, -143.192584776), x_dir=(1, 0, 0), z_dir=(0, 0, 1))) as chamfer_4_piece_2_section:
        Polygon((2.8 + CHAMFER_4_SIZE, 0), (2.8, CHAMFER_4_SIZE), (2.8, 0), align=None)
    chamfer_4_piece_2 = revolve(axis=Axis((7.5, -76.5, -143.192584776), (0, 1, 0)), mode=Mode.PRIVATE)
    chamfer_4_piece_2 = split(chamfer_4_piece_2, bisect_by=Plane(origin=(8.598627061, -75.553822664, -148.093957715), z_dir=(-0.7071067811865476, 0, 0.7071067811865476)), keep=Keep.TOP, mode=Mode.PRIVATE)
    chamfer_4_piece_2 = split(chamfer_4_piece_2, bisect_by=Plane(origin=(12, -75.553822664, -143.192584776), z_dir=(-1, 0, 0)), keep=Keep.TOP, mode=Mode.PRIVATE)
    chamfer_4_piece_2 = split(chamfer_4_piece_2, bisect_by=Plane(origin=(3.697254121, -74.5, -143.192584776), z_dir=(0, -1, 0)), keep=Keep.TOP, mode=Mode.PRIVATE)
    add(chamfer_4_piece_2)

    # Sketch1 → Cut-Extrude1 (cut)
    with BuildSketch(Plane(origin=(3, 0, 0), x_dir=(0, 0, -1), z_dir=(1, 0, 0))):
        with Locations((86.954808596, -52.5)):
            Circle(SKETCH1_R)
    extrude(amount=-CUT_EXTRUDE1_DEPTH, mode=Mode.SUBTRACT)

    # Sketch2 → Boss-Extrude1 (add)
    with BuildSketch(Plane(origin=(3, 0, 0), x_dir=(0, 0, -1), z_dir=(1, 0, 0))):
        Polygon((126.405914526, -5.161562088), (134.122760953, -17.511097881), (141.602601038, -47.511097881), (140.567007759, -61.958604825), align=None)
    extrude(amount=-BOSS_EXTRUDE1_DEPTH)


solid = part.part
